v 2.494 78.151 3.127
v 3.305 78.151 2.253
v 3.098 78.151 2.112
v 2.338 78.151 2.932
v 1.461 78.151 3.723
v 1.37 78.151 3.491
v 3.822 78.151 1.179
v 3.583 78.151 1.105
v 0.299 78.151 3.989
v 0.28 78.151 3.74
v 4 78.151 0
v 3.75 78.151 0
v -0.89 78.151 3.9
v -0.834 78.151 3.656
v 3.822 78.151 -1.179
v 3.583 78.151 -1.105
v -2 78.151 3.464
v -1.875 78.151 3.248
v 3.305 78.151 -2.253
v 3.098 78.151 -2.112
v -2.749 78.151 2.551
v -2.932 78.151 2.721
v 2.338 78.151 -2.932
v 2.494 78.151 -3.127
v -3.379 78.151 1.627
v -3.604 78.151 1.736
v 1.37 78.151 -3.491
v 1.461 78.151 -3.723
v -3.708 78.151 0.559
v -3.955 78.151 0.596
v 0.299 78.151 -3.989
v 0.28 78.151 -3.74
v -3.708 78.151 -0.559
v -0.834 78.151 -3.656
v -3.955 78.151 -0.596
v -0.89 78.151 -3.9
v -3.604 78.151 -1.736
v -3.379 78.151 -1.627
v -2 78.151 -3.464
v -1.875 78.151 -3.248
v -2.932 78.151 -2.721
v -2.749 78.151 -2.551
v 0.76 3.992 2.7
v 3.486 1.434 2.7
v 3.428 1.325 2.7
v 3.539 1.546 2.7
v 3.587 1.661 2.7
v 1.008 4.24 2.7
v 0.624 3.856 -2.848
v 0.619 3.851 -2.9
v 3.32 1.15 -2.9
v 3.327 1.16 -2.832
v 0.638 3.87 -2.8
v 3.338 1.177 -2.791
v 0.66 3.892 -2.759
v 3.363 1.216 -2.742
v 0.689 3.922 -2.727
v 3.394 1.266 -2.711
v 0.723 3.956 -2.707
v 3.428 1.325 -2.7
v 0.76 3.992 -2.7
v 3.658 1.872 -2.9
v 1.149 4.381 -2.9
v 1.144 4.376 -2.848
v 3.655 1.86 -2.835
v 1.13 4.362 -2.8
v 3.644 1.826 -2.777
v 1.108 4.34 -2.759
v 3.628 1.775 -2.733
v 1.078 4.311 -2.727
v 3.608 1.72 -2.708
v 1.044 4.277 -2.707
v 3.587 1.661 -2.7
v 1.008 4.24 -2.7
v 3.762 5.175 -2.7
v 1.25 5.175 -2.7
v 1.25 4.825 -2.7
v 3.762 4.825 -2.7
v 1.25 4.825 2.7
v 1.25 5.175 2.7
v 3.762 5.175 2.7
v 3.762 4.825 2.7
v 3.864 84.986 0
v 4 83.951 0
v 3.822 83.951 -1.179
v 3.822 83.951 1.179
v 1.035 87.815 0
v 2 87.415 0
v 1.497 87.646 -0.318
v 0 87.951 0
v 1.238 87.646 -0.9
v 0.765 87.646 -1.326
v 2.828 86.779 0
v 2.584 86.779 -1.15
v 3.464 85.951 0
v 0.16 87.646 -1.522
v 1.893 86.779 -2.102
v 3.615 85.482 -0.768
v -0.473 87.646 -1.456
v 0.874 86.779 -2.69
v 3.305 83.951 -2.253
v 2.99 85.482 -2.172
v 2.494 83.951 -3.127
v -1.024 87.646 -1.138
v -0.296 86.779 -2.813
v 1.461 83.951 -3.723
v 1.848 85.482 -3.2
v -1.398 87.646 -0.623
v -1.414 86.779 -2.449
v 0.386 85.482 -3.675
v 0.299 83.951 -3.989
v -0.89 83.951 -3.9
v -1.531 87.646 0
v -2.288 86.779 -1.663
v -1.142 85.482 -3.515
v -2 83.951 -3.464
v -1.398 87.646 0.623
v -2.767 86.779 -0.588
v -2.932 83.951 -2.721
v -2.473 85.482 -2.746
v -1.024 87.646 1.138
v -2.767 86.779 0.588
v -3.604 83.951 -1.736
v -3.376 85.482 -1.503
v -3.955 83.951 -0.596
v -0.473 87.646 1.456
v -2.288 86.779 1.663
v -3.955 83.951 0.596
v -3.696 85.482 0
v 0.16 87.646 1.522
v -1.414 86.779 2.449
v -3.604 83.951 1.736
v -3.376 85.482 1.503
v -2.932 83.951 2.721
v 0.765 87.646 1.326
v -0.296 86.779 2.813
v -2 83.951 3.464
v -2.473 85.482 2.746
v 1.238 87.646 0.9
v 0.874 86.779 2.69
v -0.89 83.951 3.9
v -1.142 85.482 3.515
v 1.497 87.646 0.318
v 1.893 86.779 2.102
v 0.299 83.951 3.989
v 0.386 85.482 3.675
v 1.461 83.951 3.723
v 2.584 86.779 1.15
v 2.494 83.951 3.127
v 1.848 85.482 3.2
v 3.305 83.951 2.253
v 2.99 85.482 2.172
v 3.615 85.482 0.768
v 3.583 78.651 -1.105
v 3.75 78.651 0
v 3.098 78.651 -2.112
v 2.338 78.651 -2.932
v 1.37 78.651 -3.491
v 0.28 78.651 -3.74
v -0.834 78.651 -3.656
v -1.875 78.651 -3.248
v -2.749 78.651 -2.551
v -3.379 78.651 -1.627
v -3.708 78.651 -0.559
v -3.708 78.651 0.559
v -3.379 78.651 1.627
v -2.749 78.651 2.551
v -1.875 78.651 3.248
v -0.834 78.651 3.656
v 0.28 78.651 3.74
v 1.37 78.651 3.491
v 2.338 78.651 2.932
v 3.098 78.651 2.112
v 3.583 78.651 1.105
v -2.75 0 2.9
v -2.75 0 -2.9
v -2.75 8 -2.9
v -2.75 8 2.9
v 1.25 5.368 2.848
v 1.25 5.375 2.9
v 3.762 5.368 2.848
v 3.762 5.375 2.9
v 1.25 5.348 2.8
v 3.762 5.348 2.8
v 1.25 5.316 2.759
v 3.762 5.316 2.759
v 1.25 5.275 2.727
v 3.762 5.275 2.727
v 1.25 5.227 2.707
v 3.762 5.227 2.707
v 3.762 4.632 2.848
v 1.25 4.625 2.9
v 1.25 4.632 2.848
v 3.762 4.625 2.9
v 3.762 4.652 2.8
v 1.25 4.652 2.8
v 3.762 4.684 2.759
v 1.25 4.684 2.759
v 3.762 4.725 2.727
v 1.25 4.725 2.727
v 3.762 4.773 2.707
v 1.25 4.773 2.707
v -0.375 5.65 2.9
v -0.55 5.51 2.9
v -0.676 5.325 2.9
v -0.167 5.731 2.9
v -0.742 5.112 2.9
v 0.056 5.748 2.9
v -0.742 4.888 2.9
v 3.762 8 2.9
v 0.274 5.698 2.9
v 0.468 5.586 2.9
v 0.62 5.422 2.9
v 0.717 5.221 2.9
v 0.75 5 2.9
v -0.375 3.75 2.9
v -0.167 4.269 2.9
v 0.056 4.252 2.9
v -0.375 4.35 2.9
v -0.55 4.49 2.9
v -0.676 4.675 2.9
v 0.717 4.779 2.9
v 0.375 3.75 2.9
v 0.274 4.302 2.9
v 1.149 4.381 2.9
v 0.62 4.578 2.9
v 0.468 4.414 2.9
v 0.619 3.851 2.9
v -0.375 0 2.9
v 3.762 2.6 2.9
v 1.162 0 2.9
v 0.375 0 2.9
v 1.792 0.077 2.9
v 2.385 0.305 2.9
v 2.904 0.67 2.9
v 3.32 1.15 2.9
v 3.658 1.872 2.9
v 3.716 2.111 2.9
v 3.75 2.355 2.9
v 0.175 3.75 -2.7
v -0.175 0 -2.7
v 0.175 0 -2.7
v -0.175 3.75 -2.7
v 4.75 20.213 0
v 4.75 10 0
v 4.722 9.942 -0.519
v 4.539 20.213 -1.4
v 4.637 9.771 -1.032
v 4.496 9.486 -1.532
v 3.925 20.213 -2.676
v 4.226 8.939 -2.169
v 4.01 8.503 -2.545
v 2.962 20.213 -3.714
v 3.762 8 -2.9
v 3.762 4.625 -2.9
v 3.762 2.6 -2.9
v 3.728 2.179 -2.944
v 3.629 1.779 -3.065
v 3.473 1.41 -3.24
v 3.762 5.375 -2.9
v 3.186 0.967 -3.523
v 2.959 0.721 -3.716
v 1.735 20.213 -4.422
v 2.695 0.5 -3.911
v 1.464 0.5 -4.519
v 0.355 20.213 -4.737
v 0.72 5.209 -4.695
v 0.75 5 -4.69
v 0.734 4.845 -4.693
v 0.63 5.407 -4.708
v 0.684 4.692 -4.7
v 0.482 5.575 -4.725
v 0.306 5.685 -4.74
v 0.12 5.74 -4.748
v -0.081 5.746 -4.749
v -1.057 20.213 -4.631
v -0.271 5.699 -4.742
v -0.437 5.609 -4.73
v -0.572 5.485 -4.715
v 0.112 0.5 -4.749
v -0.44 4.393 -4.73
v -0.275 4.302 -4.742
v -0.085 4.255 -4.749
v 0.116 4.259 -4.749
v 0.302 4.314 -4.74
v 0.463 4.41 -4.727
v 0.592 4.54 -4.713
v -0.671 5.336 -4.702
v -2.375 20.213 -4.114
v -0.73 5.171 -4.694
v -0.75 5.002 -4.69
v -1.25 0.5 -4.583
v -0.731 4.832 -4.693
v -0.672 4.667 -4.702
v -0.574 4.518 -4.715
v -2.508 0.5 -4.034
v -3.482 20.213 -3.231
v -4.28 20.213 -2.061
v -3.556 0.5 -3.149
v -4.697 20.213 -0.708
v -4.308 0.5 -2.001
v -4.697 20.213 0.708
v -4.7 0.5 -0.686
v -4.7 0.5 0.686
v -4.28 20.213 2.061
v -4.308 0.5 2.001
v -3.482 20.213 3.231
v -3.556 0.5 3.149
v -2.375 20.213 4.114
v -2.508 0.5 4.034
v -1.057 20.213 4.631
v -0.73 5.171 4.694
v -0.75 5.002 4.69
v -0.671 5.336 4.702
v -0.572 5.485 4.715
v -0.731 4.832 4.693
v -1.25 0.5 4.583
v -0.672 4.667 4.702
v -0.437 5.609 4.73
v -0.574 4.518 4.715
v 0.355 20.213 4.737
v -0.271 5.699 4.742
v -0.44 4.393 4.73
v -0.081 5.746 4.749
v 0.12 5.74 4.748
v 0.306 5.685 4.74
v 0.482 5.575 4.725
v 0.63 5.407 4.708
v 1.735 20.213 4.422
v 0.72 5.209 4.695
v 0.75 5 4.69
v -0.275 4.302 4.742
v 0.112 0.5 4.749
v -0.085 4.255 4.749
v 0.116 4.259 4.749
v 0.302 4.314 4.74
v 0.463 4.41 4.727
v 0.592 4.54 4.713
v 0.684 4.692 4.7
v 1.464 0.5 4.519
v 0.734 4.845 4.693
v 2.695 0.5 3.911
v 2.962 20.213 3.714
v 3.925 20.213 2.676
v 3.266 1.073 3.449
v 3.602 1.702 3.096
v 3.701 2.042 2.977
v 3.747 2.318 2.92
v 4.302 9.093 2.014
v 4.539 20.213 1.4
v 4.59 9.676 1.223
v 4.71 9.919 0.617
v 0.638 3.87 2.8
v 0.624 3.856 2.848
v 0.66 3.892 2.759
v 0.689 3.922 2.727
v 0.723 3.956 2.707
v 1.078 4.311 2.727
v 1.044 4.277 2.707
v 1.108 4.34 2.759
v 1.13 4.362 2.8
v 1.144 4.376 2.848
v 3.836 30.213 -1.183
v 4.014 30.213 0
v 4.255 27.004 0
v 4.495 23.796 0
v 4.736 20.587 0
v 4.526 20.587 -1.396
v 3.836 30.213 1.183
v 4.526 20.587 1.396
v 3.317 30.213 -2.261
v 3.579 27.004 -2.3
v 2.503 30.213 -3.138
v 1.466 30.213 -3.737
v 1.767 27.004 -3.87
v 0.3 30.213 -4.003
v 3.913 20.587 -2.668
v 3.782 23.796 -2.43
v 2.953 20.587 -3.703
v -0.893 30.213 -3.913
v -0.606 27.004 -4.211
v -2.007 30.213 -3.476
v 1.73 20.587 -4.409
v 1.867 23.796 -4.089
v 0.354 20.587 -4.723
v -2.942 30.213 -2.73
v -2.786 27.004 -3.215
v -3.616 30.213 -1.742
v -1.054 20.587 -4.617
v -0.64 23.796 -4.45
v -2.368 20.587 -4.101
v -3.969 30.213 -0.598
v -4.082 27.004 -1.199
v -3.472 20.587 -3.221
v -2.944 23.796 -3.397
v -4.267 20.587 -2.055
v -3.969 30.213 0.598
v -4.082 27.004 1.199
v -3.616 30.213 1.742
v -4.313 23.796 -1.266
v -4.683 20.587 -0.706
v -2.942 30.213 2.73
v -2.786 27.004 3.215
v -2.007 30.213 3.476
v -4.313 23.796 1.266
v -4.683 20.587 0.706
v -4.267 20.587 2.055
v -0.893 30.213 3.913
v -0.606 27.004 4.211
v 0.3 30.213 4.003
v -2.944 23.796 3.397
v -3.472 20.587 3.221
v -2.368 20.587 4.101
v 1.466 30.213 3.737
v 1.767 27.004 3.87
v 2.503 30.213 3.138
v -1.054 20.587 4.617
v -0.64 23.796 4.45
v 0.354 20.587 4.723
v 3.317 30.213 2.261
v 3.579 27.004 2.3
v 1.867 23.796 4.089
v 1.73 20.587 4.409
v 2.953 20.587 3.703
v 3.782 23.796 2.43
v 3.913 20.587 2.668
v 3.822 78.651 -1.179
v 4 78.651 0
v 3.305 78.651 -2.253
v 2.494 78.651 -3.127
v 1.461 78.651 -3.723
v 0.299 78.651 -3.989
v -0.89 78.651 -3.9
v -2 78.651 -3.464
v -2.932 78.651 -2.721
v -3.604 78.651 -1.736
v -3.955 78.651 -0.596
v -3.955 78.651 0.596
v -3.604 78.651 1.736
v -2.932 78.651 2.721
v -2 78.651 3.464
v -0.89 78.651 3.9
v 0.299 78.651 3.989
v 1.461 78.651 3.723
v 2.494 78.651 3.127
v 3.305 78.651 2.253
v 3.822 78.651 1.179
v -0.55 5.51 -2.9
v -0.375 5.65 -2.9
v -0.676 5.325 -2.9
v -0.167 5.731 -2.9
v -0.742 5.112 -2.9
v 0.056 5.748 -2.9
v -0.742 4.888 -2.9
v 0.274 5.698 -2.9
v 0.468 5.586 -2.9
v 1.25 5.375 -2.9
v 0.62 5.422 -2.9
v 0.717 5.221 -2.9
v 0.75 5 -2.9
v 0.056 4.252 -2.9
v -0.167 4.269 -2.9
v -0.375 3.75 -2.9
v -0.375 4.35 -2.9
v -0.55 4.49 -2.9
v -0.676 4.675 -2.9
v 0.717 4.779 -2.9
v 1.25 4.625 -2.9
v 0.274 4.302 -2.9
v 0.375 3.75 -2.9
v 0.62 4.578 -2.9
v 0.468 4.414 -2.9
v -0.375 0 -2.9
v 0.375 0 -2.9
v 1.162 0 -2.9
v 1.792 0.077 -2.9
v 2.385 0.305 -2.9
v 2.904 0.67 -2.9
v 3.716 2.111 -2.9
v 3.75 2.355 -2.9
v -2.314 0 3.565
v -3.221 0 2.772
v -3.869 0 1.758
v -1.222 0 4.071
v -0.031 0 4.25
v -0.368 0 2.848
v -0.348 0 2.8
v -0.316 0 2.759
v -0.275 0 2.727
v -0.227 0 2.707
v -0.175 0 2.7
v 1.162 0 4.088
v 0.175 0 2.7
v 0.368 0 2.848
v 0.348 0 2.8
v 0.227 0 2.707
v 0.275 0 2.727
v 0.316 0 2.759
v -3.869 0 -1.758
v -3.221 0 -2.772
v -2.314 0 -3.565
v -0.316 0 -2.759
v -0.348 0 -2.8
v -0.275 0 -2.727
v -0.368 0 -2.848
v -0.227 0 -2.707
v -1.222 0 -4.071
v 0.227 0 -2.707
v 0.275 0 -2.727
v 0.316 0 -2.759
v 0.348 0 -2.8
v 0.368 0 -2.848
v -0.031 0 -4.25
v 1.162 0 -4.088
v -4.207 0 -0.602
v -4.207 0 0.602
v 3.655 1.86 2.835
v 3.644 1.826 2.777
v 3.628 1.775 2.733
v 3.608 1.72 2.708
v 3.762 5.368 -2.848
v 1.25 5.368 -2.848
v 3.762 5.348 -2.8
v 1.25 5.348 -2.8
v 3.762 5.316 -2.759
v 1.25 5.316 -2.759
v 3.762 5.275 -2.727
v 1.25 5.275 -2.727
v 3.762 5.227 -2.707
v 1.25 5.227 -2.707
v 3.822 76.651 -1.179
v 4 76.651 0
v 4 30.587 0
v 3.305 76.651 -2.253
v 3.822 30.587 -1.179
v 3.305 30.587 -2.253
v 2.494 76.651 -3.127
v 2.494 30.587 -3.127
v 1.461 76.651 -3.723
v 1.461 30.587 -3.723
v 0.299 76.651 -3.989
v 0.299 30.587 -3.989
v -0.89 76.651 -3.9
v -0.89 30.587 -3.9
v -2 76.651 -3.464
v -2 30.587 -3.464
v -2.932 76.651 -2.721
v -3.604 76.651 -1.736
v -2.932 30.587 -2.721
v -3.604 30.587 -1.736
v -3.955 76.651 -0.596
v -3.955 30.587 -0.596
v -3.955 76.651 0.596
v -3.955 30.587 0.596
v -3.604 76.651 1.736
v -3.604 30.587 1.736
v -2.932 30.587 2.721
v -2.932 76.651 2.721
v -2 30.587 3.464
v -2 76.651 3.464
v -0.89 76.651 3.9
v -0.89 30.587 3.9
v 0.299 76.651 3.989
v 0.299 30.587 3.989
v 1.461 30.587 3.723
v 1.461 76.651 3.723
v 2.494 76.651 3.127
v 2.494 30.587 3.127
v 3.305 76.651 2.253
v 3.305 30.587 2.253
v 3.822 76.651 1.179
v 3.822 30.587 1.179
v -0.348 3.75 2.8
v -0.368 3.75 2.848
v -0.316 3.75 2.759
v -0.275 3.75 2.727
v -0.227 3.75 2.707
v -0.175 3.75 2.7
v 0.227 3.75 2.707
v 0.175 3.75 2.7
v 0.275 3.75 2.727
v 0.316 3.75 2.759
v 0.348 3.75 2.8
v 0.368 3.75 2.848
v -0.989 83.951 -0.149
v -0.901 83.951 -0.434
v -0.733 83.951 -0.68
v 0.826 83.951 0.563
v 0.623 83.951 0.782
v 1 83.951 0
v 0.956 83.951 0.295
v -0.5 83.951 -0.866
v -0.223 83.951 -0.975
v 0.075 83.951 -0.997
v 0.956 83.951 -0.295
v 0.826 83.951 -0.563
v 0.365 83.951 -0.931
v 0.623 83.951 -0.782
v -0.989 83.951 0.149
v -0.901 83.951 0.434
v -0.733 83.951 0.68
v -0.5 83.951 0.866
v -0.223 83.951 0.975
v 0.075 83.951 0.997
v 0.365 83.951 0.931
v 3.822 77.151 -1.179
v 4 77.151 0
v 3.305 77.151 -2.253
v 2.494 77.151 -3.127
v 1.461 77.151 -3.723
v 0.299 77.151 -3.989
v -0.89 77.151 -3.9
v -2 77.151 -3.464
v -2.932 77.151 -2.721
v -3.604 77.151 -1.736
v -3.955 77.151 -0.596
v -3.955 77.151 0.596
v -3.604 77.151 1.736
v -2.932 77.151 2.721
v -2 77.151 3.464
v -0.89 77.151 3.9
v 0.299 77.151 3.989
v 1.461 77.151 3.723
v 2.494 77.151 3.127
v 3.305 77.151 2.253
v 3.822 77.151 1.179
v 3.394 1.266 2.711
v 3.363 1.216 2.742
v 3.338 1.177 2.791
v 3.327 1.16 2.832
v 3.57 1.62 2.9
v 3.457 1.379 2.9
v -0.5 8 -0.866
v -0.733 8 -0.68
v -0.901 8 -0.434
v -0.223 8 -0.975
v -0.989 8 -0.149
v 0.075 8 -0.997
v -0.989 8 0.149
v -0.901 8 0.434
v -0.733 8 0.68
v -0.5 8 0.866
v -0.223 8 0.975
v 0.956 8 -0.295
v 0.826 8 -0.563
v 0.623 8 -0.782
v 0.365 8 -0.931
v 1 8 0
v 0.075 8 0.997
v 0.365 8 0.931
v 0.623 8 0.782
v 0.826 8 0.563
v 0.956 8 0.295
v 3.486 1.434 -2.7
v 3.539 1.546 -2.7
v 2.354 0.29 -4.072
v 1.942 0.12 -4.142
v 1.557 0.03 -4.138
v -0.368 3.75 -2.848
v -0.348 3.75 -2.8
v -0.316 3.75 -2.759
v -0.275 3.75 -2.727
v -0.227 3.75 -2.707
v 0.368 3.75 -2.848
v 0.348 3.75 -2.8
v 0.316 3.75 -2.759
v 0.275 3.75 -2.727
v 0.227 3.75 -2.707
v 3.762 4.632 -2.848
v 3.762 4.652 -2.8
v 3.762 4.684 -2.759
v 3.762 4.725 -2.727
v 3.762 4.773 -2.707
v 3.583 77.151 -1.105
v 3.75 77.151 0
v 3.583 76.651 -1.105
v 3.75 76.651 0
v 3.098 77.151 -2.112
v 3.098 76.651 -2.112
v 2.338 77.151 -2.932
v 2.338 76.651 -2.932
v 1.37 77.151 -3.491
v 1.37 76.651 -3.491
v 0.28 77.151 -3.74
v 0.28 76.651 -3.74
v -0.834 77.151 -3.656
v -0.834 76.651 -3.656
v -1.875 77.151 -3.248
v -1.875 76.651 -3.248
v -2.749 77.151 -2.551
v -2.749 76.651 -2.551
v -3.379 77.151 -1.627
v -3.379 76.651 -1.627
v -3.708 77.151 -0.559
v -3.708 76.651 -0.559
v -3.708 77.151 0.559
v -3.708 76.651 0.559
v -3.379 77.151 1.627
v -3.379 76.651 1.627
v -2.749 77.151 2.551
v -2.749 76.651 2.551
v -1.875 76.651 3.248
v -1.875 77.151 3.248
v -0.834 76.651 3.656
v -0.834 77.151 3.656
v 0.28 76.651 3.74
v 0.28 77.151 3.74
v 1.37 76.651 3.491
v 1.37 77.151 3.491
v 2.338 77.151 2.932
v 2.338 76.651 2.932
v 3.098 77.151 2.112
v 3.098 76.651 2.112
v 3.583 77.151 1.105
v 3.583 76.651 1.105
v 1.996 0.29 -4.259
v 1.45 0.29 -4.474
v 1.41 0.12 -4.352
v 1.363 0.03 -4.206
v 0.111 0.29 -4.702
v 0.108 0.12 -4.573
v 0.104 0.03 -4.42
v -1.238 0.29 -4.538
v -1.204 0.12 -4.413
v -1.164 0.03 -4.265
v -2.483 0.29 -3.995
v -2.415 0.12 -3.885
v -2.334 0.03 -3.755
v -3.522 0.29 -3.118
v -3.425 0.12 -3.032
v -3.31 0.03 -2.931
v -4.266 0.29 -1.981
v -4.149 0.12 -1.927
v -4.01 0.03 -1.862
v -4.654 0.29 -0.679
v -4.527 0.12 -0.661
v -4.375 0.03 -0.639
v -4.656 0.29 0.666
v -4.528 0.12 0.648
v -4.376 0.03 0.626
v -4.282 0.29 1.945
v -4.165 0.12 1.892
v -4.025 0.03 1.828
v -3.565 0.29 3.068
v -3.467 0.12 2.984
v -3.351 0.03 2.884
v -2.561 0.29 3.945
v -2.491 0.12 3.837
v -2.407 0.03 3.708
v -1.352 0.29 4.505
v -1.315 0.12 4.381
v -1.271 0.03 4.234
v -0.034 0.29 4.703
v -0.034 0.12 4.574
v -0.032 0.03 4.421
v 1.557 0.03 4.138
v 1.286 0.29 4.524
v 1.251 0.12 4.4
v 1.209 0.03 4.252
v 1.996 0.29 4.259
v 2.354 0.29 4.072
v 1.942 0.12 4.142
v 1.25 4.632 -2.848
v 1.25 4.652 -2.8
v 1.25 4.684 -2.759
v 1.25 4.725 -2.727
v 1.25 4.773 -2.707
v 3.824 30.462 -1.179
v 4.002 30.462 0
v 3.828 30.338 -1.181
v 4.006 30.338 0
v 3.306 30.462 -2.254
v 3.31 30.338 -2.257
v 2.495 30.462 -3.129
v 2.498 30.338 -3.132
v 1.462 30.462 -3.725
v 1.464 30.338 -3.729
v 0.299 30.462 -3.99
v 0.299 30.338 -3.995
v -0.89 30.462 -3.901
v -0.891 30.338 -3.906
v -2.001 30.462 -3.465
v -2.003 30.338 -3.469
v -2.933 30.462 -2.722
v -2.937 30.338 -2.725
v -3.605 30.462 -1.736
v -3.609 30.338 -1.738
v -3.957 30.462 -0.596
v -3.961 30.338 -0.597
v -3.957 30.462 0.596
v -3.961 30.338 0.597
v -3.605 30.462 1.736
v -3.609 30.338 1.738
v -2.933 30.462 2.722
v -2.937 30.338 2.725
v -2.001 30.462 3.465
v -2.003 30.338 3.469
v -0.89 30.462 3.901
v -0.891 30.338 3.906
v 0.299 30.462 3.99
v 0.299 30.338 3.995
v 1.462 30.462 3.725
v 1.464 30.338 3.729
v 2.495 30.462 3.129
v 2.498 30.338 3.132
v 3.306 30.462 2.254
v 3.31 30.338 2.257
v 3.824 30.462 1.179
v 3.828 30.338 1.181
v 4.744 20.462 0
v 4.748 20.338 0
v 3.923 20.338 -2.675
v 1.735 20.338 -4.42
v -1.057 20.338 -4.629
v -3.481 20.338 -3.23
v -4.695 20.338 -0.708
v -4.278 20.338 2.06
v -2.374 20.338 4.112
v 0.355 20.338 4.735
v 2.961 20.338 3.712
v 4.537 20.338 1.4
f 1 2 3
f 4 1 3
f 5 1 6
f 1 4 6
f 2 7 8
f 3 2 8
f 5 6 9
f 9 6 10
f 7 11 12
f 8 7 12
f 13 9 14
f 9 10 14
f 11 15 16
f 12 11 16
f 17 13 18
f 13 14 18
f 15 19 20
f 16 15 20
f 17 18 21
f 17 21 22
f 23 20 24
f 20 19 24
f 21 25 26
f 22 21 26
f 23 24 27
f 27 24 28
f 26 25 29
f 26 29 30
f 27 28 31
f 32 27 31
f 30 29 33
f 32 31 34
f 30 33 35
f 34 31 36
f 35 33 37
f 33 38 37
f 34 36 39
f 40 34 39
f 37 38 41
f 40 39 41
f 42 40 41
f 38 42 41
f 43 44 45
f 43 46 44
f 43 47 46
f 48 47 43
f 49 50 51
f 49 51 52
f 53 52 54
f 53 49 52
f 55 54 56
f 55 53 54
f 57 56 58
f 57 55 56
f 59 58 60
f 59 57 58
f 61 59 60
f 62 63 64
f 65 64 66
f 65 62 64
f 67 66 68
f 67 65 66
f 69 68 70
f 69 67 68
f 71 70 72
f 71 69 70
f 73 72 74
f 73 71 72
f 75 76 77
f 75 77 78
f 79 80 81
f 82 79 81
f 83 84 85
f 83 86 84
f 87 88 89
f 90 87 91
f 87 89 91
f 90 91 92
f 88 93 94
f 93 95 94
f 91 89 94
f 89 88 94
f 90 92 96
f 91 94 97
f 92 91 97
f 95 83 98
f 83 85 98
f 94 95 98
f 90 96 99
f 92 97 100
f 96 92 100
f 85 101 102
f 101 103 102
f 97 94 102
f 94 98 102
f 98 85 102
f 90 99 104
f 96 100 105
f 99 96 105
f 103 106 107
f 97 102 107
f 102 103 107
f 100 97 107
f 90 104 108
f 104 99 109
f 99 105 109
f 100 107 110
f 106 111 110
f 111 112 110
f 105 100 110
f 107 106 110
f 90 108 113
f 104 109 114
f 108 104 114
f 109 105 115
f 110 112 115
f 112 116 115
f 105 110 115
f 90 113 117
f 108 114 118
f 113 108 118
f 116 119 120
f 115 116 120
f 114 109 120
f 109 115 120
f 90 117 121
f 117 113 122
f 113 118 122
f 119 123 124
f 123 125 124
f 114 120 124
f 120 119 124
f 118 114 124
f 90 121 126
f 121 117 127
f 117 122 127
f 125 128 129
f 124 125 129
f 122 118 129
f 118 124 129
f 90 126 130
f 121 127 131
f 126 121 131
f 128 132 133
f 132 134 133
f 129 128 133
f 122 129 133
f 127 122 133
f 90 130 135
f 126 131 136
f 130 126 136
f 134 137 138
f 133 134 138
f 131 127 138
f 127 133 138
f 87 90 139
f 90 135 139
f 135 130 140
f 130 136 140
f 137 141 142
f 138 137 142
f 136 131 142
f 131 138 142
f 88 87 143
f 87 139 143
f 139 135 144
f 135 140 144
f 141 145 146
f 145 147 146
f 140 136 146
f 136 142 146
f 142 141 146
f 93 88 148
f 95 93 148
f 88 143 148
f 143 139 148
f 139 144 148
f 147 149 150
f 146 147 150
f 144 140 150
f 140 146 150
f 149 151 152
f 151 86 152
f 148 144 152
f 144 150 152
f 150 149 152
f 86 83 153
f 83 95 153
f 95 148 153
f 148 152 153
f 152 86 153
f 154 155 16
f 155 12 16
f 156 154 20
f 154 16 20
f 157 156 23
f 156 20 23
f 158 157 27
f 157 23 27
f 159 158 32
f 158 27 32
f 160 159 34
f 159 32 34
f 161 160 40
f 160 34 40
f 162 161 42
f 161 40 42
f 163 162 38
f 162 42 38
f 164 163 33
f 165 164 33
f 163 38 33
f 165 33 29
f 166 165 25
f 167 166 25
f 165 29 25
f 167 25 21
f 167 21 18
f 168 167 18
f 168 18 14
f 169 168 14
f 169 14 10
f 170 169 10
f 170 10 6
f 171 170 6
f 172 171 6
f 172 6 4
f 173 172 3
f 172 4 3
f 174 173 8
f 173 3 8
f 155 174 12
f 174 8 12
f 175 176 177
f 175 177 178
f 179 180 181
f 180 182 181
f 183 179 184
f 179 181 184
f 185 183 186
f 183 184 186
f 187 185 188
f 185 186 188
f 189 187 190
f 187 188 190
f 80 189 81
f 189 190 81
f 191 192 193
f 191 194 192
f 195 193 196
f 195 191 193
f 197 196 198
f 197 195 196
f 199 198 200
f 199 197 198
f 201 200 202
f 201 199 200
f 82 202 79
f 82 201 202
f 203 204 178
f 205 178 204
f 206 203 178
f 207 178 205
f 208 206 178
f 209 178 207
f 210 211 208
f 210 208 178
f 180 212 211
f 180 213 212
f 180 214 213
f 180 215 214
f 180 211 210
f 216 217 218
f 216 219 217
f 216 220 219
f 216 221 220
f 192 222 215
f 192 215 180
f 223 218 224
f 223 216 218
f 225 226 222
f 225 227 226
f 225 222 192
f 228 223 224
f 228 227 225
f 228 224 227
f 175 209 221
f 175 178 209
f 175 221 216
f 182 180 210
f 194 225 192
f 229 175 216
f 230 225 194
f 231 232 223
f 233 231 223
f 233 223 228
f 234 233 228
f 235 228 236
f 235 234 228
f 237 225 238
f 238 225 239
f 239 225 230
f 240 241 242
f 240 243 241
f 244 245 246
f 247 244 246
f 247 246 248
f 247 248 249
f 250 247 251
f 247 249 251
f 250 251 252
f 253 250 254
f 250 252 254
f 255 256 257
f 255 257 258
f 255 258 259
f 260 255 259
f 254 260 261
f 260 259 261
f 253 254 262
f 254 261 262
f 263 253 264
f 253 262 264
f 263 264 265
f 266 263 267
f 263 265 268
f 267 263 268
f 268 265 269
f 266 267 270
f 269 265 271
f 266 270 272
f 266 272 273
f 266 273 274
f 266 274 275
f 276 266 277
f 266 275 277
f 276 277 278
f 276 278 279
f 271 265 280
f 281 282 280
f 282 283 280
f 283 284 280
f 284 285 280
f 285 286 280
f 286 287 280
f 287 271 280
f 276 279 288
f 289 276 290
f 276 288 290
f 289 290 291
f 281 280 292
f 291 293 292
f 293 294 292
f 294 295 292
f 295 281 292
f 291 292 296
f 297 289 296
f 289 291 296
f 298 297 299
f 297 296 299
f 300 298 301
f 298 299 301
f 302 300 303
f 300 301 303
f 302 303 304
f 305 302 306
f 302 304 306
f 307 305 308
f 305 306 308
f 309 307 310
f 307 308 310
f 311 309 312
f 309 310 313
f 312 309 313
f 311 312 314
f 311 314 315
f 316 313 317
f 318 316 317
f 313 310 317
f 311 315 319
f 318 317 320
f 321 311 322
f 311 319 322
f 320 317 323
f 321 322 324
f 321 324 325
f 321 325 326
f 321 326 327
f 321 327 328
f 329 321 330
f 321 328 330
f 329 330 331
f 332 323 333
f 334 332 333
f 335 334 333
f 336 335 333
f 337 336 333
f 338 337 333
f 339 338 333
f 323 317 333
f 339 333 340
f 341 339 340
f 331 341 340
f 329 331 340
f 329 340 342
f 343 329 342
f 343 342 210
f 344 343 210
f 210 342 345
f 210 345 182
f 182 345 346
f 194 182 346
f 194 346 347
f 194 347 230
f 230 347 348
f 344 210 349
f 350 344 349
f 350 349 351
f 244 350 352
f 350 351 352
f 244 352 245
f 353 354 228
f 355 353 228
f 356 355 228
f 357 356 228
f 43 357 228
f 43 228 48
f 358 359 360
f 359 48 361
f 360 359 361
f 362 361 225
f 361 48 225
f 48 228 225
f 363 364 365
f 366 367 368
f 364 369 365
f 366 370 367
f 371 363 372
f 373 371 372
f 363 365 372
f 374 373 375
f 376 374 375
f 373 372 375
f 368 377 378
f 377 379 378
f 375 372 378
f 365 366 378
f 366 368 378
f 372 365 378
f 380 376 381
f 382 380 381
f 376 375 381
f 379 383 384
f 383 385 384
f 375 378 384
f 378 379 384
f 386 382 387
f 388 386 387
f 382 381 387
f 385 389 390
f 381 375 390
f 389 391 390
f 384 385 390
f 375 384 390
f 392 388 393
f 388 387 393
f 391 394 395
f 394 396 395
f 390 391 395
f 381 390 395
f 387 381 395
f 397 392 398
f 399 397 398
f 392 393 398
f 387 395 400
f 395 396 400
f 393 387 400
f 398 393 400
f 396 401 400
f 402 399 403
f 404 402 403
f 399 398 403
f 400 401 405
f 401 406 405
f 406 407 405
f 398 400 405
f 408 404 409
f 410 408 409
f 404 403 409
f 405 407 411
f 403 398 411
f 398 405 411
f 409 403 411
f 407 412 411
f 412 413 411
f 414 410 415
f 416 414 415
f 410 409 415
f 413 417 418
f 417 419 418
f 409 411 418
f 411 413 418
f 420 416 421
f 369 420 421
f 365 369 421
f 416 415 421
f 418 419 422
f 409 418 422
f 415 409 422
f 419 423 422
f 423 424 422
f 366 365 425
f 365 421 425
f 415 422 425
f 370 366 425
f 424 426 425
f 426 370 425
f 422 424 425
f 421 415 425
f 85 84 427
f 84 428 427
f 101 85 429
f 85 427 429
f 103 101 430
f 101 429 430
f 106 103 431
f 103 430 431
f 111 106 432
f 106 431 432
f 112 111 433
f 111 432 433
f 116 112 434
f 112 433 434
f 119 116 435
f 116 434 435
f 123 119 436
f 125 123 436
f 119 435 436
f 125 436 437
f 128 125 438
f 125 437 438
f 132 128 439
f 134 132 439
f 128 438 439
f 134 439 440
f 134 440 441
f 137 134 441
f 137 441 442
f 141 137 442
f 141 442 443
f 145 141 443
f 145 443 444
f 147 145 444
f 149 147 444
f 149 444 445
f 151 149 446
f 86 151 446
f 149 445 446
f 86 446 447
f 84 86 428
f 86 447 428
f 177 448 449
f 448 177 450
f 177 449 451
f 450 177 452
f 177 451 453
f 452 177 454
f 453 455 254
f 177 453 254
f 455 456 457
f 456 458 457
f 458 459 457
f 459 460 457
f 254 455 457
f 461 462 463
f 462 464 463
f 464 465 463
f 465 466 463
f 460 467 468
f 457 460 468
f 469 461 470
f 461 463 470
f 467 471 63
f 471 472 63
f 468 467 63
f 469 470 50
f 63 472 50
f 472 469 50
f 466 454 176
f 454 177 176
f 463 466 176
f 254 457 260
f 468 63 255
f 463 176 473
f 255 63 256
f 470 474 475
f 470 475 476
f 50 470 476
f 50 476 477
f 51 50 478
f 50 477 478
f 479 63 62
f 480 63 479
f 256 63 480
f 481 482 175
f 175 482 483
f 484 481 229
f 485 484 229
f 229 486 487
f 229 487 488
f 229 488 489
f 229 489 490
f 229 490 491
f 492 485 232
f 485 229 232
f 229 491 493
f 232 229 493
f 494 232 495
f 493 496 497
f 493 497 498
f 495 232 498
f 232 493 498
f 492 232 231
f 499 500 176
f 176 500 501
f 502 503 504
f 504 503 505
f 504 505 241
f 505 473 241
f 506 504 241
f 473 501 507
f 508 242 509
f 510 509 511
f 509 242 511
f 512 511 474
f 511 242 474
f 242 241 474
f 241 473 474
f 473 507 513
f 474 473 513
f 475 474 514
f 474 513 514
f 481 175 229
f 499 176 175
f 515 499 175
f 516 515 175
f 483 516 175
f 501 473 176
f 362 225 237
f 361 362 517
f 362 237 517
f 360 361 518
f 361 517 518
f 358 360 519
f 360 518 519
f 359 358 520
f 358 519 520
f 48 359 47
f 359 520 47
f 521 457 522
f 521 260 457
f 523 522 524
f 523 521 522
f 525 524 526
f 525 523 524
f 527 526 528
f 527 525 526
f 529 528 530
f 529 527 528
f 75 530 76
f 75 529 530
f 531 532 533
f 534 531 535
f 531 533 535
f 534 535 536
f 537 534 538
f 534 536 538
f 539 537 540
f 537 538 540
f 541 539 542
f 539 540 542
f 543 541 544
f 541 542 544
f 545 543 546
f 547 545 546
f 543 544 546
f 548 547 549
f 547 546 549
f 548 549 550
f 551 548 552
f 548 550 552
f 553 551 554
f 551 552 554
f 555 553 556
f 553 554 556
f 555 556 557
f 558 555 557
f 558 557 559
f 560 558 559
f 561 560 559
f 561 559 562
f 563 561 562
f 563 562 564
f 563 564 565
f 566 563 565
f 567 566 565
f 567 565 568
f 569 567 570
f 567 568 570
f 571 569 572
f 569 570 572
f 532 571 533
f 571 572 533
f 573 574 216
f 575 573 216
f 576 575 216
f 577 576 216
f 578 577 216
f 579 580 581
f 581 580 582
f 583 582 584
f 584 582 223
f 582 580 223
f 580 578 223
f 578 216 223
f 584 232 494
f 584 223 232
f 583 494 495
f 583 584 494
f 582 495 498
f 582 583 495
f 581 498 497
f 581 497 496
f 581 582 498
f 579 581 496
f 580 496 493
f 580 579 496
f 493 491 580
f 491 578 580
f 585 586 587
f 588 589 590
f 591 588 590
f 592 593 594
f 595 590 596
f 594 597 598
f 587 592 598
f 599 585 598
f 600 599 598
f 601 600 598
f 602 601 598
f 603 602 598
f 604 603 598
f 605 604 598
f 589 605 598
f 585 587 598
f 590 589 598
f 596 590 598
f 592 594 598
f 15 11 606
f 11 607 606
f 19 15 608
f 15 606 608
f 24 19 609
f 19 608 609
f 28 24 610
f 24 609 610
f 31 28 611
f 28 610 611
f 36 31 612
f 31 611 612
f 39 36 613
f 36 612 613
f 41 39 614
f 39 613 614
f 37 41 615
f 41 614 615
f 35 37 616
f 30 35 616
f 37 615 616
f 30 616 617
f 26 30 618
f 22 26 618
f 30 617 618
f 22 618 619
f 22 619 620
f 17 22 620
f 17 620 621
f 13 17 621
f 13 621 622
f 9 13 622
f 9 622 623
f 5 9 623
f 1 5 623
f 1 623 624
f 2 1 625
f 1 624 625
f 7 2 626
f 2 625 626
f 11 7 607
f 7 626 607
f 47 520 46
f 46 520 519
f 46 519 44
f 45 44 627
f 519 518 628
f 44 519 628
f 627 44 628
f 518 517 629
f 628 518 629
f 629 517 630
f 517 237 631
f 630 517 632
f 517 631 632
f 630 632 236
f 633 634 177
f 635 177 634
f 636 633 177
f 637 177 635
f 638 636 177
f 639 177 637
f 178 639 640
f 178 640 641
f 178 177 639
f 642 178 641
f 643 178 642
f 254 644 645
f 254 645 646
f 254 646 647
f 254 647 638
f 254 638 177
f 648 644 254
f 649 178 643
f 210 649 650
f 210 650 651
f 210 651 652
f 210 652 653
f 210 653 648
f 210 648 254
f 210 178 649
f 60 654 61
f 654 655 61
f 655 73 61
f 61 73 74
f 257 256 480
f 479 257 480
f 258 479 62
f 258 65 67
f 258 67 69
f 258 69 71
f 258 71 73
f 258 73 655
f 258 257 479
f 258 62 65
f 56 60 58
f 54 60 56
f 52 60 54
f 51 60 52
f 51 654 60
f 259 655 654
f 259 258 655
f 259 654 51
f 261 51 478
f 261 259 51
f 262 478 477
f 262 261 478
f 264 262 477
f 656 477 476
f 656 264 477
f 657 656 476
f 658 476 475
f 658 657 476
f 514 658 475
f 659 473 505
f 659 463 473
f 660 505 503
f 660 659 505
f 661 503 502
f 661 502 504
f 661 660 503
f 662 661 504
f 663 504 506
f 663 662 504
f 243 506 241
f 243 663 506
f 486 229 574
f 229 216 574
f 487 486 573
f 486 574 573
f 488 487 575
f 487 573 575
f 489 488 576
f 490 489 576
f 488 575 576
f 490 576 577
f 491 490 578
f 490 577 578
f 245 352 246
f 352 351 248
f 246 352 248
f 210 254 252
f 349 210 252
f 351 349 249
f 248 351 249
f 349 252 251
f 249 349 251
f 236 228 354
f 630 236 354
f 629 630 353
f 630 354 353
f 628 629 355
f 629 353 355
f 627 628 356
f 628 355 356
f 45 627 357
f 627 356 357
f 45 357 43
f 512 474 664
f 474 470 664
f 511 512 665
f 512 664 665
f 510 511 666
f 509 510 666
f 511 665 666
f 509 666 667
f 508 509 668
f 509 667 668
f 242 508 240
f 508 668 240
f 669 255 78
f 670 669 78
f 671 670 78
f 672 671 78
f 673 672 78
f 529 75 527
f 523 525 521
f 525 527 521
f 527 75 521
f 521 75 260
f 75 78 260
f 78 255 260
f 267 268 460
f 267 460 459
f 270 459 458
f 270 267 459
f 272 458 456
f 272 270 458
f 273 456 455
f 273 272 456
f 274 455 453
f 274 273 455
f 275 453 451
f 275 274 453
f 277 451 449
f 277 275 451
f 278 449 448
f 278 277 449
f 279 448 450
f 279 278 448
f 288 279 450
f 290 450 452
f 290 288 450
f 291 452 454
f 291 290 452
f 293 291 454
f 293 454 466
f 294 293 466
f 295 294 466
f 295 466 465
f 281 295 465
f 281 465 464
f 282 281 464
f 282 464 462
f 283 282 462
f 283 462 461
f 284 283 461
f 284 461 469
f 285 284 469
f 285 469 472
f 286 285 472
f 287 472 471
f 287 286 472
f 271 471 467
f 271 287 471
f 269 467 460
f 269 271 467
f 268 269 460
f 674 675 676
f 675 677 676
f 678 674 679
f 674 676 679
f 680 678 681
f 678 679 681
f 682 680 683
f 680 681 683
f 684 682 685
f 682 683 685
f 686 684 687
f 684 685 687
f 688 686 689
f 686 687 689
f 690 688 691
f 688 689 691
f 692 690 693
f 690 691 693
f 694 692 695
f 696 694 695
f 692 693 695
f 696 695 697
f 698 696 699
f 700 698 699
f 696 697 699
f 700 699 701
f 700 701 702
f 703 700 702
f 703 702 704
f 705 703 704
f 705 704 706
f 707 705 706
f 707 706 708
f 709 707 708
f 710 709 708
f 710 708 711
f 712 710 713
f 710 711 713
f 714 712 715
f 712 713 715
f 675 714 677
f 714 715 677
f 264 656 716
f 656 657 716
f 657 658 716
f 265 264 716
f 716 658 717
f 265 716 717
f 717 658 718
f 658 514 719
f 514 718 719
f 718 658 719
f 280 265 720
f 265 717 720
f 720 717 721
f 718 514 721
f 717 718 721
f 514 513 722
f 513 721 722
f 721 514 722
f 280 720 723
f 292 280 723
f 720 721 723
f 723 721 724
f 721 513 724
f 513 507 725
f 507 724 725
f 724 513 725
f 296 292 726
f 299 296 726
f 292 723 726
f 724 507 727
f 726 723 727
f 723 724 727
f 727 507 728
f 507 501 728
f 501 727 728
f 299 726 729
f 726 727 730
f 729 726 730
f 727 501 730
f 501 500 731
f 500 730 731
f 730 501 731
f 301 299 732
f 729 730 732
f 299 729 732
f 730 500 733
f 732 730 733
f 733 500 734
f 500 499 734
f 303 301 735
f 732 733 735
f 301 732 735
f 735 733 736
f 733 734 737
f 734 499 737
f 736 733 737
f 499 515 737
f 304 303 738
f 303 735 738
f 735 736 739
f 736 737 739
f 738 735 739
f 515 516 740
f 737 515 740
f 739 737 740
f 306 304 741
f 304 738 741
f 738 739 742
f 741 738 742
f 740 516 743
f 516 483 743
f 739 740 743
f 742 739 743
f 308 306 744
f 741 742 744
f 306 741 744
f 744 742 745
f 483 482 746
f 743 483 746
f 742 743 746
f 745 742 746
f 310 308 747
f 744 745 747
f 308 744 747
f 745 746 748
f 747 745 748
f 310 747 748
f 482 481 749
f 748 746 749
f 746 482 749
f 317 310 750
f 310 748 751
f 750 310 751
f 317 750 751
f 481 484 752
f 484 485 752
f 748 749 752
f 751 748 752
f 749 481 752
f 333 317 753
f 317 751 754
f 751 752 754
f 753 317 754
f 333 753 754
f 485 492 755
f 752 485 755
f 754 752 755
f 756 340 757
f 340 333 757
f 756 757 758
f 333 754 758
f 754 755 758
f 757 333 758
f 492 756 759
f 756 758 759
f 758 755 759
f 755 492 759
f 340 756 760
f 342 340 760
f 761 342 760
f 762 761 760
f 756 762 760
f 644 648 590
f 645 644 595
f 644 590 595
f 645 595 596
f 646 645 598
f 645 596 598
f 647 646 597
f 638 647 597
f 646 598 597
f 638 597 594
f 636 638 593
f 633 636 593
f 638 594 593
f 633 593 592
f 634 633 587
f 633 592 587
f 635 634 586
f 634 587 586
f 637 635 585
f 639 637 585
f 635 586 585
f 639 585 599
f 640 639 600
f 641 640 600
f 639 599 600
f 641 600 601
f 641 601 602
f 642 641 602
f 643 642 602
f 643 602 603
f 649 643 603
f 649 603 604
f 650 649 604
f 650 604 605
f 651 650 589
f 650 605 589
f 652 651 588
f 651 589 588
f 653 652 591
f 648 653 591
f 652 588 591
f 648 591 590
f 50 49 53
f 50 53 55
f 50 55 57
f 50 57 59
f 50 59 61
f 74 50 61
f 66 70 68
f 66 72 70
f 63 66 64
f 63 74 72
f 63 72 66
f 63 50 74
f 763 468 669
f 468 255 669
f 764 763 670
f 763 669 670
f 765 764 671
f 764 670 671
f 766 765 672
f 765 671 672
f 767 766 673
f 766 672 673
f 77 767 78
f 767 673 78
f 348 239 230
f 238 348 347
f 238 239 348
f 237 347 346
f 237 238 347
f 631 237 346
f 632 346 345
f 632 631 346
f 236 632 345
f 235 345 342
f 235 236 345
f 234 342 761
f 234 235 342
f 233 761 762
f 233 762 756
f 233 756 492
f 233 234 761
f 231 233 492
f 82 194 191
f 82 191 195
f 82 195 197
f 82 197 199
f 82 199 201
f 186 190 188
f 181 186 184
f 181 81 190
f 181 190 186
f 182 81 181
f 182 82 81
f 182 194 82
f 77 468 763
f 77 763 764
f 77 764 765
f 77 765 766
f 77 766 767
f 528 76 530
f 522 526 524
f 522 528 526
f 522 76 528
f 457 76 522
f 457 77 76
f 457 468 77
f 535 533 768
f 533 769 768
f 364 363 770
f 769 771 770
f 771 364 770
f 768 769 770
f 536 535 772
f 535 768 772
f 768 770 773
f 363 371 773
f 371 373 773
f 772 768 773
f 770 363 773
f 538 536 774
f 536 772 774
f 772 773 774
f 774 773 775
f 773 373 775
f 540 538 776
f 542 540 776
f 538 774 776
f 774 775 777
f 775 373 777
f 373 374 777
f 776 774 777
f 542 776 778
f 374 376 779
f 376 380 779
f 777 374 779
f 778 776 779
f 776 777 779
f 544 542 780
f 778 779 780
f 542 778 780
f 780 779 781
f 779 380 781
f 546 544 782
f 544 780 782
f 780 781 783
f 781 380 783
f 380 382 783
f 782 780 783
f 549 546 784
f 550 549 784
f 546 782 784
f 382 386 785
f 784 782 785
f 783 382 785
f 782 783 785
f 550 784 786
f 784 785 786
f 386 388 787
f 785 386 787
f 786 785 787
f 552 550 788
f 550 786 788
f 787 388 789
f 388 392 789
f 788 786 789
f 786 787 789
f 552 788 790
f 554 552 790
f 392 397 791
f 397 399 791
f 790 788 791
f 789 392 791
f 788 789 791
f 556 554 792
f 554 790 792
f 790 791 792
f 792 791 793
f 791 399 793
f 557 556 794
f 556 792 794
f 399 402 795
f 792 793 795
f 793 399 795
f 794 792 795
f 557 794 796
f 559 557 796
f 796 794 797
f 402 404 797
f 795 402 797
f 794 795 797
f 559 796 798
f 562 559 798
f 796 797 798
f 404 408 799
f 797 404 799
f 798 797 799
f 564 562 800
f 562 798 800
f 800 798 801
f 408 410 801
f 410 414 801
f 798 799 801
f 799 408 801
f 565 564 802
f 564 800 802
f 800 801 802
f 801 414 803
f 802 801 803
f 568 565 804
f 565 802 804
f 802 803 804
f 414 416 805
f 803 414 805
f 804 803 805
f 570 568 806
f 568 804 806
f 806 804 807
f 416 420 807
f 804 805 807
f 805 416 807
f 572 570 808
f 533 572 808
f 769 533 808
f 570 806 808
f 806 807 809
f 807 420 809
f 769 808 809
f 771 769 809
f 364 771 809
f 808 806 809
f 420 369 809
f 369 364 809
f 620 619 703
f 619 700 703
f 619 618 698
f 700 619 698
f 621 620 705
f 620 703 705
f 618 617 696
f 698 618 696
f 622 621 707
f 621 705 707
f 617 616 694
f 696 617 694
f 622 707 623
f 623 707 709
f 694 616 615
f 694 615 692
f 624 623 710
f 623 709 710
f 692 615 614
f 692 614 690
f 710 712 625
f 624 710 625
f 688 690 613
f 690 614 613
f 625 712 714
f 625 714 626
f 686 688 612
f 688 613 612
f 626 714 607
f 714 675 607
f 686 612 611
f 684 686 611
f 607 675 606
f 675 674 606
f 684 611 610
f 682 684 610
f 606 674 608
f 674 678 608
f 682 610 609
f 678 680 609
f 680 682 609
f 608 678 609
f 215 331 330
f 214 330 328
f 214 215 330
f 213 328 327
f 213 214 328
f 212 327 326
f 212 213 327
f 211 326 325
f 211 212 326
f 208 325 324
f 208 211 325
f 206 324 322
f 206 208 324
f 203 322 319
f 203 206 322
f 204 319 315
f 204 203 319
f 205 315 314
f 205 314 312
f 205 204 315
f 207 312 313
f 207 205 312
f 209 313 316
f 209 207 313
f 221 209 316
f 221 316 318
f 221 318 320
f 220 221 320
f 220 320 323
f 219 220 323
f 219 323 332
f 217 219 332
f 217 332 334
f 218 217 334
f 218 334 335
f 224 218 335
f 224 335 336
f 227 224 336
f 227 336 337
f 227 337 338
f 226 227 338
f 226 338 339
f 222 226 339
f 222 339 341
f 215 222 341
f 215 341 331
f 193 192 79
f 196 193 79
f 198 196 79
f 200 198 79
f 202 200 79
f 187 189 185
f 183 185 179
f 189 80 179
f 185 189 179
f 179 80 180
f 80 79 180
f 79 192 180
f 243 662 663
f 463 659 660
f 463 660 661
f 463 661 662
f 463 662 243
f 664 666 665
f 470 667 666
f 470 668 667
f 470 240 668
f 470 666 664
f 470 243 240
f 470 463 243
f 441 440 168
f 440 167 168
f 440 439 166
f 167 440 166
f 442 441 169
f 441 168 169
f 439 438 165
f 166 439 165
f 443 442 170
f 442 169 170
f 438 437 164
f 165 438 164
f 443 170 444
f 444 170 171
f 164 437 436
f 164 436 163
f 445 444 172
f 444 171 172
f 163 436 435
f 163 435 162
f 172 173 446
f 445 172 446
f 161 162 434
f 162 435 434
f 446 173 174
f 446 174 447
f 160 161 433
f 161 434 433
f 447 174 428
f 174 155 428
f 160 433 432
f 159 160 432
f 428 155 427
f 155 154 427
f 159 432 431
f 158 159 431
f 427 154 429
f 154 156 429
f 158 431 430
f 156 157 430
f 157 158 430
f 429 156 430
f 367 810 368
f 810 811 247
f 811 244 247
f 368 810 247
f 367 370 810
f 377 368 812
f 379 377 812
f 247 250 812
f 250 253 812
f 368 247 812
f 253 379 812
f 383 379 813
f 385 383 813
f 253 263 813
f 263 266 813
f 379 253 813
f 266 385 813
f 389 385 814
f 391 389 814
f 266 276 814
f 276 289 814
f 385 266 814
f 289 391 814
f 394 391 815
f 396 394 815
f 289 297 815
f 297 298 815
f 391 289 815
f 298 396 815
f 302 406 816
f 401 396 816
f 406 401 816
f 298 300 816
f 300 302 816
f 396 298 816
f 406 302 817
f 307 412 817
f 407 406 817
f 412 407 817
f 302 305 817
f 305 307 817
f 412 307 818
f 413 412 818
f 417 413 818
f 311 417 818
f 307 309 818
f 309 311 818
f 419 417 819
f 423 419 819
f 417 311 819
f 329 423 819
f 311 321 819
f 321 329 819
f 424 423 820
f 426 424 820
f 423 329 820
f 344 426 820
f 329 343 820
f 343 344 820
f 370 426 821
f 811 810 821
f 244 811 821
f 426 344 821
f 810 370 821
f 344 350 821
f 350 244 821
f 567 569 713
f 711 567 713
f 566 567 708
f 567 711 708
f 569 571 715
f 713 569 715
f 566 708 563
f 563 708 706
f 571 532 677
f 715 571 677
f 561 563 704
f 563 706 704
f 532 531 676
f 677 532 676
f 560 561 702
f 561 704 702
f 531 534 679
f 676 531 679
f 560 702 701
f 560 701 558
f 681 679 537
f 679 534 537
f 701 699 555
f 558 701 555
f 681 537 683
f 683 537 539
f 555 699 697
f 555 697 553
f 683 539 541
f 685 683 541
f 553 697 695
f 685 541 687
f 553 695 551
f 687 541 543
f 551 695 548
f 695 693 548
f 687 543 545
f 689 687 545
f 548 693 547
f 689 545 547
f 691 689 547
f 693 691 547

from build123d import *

# Parameters (mm, degrees)
ESQUISSE3_W                  = 7.5
ESQUISSE3_H                  = 5.8
ENL_V_MAT_EXTRU_1_DEPTH      = 8
CONG_1_R                     = 0.5
ENL_V_MAT_EXTRU_2_DEPTH      = 89.206964432
ENL_V_MAT_EXTRU_2_DEPTH_BACK = 89.206964432
ESQUISSE4_R                  = 0.75
ESQUISSE5_W                  = 0.75
ESQUISSE5_H                  = 3.75
ESQUISSE5_W_2                = 2.511980861
ESQUISSE5_H_2                = 0.75
BOSS_EXTRU_1_DEPTH           = 0.2
CONG_2_R                     = 0.2
CONG_2_OF_SYM_TRIE1_R        = 0.2
ENL_V_MAT_EXTRU_3_DEPTH      = 89.410568231


with BuildPart() as part:
    # Esquisse2 → Révolution1 (revolve)
    with BuildSketch(Plane.XY):
        with BuildLine():
            Line((4.014003451, 30.213287326), (4.735996549, 20.586712674))
            ThreePointArc((4.735996549, 20.586712674), (4.746497911, 20.399868856), (4.75, 20.212762933))
            Line((4.75, 20.212762933), (4.75, 0))
            Line((4.75, 0), (1, 0))
            Line((1, 0), (1, 83.950802))
            Line((1, 83.950802), (0, 83.950802))
            Line((0, 83.950802), (0, 87.950802))
            ThreePointArc((0, 87.950802), (2.828427125, 86.779229125), (4, 83.950802))
            Line((4, 83.950802), (4, 78.650802))
            Line((4, 78.650802), (3.75, 78.650802))
            Line((3.75, 78.650802), (3.75, 78.150802))
            Line((3.75, 78.150802), (4, 78.150802))
            Line((4, 78.150802), (4, 77.150802))
            Line((4, 77.150802), (3.75, 77.150802))
            Line((3.75, 77.150802), (3.75, 76.650802))
            Line((3.75, 76.650802), (4, 76.650802))
            Line((4, 76.650802), (4, 30.587237067))
            ThreePointArc((4, 30.587237067), (4.003502089, 30.400131144), (4.014003451, 30.213287326))
        make_face()
    revolve(axis=Axis((0, 0, 0), (0, 1, 0)))

    # Esquisse3 → Enlèv. mat.-Extru.1 (cut)
    with BuildSketch(Plane.XZ):
        with Locations((1, 0)):
            Rectangle(ESQUISSE3_W, ESQUISSE3_H)
    extrude(amount=-ENL_V_MAT_EXTRU_1_DEPTH, mode=Mode.SUBTRACT)

    # Congé1
    cong_1_edges = [part.edges().sort_by_distance(p)[0] for p in [
        (-4.75, 0, 0),
    ]]
    fillet(cong_1_edges, radius=CONG_1_R)

    # Esquisse4 → Enlèv. mat.-Extru.2 (cut, two sides: drawn at the far end of the back side and taken through both)
    with BuildSketch(Plane.XY.offset(-ENL_V_MAT_EXTRU_2_DEPTH_BACK)):
        with Locations((0, 5)):
            Circle(ESQUISSE4_R)
        with BuildLine():
            Line((1.161980861, 0), (3.761980861, 0))
            Line((3.761980861, 0), (3.761980861, 2.6))
            ThreePointArc((3.761980861, 2.6), (3.000458492, 0.761522369), (1.161980861, 0))
        make_face()
        Polygon((3.761980861, 8), (4.75, 10), (4.75, 8), align=None)
    extrude(amount=ENL_V_MAT_EXTRU_2_DEPTH + ENL_V_MAT_EXTRU_2_DEPTH_BACK, mode=Mode.SUBTRACT)

    # Esquisse5 → Boss.-Extru.1 (add)
    with BuildSketch(Plane.XY.offset(-2.9)):
        with Locations((0, 1.875)):
            Rectangle(ESQUISSE5_W, ESQUISSE5_H)
        Polygon((0.618718434, 3.850951481), (1.149048519, 4.381281566), (4.027145904, 1.503184182), (3.496815818, 0.972854096), align=None)
        with Locations((2.50599043, 5)):
            Rectangle(ESQUISSE5_W_2, ESQUISSE5_H_2)
    boss_extru_1 = extrude(amount=BOSS_EXTRU_1_DEPTH)

    # Congé2
    cong_2_edges = [part.edges().sort_by_distance(p)[0] for p in [
        (2.505990431, 5.375, -2.7),
        (2.505990431, 4.625, -2.7),
        (2.588097212, 2.942232874, -2.7),
        (2.057767126, 2.411902788, -2.7),
        (-0.375, 1.875, -2.7),
        (0.375, 1.875, -2.7),
    ]]
    fillet(cong_2_edges, radius=CONG_2_R - 0.0001)  # a hair under: the kernel refuses the full size

    # Symétrie1: Boss.-Extru.1 across plane
    add(boss_extru_1.mirror(Plane.XY))

    # Congé2 of Symétrie1
    cong_2_of_sym_trie1_edges = [part.edges().sort_by_distance(p)[0] for p in [
        (2.505990431, 5.375, 2.7),
        (2.505990431, 4.625, 2.7),
        (2.588097212, 2.942232874, 2.7),
        (2.057767126, 2.411902788, 2.7),
        (-0.375, 1.875, 2.7),
        (0.375, 1.875, 2.7),
    ]]
    fillet(cong_2_of_sym_trie1_edges, radius=CONG_2_OF_SYM_TRIE1_R - 0.0001)  # a hair under: the kernel refuses the full size

    # Esquisse6 → Enlèv. mat.-Extru.3 (cut, through all)
    with BuildSketch(Plane.XY.offset(2.9)):
        with BuildLine():
            Line((4.027145904, 1.503184182), (3.658059706, 1.87227038))
            ThreePointArc((3.658059706, 1.87227038), (3.516870908, 1.49795968), (3.319930166, 1.149739748))
            Line((3.319930166, 1.149739748), (3.496815818, 0.972854096))
            Line((3.496815818, 0.972854096), (4.027145904, 1.503184182))
        make_face()
    extrude(amount=-ENL_V_MAT_EXTRU_3_DEPTH, mode=Mode.SUBTRACT)


solid = part.part
